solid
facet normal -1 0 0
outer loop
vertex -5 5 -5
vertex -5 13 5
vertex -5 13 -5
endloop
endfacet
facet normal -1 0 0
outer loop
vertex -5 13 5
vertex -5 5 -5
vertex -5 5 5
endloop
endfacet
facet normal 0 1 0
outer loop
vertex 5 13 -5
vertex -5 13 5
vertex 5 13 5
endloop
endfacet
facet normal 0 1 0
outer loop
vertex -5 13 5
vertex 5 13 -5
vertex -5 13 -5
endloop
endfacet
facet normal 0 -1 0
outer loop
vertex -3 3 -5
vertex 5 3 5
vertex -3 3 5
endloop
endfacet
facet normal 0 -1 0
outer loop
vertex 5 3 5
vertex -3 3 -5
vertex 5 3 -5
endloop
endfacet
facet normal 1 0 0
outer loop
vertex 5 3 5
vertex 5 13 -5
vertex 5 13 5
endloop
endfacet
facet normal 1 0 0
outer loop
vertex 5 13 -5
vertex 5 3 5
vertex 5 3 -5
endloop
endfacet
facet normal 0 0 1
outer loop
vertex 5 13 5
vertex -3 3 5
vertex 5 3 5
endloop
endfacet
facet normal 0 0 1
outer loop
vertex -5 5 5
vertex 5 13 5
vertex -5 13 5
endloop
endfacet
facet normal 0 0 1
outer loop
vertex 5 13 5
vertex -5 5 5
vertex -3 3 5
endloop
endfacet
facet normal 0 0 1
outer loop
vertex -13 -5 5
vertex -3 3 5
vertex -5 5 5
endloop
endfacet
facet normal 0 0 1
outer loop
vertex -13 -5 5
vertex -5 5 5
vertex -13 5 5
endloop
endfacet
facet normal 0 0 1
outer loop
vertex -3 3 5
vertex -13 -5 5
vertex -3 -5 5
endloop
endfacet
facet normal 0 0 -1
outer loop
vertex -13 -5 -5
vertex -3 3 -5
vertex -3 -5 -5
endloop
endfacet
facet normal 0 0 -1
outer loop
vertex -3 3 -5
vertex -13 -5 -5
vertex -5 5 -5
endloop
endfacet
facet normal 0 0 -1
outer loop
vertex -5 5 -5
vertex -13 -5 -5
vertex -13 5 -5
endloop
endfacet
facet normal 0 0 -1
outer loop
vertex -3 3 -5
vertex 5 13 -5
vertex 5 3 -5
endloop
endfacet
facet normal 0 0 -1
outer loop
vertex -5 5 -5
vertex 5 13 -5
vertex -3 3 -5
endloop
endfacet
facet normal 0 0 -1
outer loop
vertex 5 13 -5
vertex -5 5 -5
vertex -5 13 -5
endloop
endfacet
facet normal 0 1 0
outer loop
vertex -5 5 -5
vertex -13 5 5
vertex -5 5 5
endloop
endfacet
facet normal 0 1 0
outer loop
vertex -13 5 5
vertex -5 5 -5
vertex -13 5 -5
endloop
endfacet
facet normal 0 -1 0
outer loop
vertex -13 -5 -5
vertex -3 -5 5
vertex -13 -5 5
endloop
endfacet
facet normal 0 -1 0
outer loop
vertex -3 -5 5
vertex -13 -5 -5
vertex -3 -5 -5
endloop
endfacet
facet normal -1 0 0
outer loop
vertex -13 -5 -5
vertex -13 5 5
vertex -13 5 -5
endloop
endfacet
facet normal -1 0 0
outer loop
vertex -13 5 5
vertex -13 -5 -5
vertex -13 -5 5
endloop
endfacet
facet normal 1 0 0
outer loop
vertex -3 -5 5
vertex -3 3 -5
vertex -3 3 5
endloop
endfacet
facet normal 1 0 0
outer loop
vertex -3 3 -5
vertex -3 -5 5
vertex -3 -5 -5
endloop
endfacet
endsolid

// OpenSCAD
rotate([90,0,180]) translate ([0, 0, 8]) cube(10, center=true); 
rotate([90,0,270]) translate ([0, 0, 8]) cube(10, center=true); 
